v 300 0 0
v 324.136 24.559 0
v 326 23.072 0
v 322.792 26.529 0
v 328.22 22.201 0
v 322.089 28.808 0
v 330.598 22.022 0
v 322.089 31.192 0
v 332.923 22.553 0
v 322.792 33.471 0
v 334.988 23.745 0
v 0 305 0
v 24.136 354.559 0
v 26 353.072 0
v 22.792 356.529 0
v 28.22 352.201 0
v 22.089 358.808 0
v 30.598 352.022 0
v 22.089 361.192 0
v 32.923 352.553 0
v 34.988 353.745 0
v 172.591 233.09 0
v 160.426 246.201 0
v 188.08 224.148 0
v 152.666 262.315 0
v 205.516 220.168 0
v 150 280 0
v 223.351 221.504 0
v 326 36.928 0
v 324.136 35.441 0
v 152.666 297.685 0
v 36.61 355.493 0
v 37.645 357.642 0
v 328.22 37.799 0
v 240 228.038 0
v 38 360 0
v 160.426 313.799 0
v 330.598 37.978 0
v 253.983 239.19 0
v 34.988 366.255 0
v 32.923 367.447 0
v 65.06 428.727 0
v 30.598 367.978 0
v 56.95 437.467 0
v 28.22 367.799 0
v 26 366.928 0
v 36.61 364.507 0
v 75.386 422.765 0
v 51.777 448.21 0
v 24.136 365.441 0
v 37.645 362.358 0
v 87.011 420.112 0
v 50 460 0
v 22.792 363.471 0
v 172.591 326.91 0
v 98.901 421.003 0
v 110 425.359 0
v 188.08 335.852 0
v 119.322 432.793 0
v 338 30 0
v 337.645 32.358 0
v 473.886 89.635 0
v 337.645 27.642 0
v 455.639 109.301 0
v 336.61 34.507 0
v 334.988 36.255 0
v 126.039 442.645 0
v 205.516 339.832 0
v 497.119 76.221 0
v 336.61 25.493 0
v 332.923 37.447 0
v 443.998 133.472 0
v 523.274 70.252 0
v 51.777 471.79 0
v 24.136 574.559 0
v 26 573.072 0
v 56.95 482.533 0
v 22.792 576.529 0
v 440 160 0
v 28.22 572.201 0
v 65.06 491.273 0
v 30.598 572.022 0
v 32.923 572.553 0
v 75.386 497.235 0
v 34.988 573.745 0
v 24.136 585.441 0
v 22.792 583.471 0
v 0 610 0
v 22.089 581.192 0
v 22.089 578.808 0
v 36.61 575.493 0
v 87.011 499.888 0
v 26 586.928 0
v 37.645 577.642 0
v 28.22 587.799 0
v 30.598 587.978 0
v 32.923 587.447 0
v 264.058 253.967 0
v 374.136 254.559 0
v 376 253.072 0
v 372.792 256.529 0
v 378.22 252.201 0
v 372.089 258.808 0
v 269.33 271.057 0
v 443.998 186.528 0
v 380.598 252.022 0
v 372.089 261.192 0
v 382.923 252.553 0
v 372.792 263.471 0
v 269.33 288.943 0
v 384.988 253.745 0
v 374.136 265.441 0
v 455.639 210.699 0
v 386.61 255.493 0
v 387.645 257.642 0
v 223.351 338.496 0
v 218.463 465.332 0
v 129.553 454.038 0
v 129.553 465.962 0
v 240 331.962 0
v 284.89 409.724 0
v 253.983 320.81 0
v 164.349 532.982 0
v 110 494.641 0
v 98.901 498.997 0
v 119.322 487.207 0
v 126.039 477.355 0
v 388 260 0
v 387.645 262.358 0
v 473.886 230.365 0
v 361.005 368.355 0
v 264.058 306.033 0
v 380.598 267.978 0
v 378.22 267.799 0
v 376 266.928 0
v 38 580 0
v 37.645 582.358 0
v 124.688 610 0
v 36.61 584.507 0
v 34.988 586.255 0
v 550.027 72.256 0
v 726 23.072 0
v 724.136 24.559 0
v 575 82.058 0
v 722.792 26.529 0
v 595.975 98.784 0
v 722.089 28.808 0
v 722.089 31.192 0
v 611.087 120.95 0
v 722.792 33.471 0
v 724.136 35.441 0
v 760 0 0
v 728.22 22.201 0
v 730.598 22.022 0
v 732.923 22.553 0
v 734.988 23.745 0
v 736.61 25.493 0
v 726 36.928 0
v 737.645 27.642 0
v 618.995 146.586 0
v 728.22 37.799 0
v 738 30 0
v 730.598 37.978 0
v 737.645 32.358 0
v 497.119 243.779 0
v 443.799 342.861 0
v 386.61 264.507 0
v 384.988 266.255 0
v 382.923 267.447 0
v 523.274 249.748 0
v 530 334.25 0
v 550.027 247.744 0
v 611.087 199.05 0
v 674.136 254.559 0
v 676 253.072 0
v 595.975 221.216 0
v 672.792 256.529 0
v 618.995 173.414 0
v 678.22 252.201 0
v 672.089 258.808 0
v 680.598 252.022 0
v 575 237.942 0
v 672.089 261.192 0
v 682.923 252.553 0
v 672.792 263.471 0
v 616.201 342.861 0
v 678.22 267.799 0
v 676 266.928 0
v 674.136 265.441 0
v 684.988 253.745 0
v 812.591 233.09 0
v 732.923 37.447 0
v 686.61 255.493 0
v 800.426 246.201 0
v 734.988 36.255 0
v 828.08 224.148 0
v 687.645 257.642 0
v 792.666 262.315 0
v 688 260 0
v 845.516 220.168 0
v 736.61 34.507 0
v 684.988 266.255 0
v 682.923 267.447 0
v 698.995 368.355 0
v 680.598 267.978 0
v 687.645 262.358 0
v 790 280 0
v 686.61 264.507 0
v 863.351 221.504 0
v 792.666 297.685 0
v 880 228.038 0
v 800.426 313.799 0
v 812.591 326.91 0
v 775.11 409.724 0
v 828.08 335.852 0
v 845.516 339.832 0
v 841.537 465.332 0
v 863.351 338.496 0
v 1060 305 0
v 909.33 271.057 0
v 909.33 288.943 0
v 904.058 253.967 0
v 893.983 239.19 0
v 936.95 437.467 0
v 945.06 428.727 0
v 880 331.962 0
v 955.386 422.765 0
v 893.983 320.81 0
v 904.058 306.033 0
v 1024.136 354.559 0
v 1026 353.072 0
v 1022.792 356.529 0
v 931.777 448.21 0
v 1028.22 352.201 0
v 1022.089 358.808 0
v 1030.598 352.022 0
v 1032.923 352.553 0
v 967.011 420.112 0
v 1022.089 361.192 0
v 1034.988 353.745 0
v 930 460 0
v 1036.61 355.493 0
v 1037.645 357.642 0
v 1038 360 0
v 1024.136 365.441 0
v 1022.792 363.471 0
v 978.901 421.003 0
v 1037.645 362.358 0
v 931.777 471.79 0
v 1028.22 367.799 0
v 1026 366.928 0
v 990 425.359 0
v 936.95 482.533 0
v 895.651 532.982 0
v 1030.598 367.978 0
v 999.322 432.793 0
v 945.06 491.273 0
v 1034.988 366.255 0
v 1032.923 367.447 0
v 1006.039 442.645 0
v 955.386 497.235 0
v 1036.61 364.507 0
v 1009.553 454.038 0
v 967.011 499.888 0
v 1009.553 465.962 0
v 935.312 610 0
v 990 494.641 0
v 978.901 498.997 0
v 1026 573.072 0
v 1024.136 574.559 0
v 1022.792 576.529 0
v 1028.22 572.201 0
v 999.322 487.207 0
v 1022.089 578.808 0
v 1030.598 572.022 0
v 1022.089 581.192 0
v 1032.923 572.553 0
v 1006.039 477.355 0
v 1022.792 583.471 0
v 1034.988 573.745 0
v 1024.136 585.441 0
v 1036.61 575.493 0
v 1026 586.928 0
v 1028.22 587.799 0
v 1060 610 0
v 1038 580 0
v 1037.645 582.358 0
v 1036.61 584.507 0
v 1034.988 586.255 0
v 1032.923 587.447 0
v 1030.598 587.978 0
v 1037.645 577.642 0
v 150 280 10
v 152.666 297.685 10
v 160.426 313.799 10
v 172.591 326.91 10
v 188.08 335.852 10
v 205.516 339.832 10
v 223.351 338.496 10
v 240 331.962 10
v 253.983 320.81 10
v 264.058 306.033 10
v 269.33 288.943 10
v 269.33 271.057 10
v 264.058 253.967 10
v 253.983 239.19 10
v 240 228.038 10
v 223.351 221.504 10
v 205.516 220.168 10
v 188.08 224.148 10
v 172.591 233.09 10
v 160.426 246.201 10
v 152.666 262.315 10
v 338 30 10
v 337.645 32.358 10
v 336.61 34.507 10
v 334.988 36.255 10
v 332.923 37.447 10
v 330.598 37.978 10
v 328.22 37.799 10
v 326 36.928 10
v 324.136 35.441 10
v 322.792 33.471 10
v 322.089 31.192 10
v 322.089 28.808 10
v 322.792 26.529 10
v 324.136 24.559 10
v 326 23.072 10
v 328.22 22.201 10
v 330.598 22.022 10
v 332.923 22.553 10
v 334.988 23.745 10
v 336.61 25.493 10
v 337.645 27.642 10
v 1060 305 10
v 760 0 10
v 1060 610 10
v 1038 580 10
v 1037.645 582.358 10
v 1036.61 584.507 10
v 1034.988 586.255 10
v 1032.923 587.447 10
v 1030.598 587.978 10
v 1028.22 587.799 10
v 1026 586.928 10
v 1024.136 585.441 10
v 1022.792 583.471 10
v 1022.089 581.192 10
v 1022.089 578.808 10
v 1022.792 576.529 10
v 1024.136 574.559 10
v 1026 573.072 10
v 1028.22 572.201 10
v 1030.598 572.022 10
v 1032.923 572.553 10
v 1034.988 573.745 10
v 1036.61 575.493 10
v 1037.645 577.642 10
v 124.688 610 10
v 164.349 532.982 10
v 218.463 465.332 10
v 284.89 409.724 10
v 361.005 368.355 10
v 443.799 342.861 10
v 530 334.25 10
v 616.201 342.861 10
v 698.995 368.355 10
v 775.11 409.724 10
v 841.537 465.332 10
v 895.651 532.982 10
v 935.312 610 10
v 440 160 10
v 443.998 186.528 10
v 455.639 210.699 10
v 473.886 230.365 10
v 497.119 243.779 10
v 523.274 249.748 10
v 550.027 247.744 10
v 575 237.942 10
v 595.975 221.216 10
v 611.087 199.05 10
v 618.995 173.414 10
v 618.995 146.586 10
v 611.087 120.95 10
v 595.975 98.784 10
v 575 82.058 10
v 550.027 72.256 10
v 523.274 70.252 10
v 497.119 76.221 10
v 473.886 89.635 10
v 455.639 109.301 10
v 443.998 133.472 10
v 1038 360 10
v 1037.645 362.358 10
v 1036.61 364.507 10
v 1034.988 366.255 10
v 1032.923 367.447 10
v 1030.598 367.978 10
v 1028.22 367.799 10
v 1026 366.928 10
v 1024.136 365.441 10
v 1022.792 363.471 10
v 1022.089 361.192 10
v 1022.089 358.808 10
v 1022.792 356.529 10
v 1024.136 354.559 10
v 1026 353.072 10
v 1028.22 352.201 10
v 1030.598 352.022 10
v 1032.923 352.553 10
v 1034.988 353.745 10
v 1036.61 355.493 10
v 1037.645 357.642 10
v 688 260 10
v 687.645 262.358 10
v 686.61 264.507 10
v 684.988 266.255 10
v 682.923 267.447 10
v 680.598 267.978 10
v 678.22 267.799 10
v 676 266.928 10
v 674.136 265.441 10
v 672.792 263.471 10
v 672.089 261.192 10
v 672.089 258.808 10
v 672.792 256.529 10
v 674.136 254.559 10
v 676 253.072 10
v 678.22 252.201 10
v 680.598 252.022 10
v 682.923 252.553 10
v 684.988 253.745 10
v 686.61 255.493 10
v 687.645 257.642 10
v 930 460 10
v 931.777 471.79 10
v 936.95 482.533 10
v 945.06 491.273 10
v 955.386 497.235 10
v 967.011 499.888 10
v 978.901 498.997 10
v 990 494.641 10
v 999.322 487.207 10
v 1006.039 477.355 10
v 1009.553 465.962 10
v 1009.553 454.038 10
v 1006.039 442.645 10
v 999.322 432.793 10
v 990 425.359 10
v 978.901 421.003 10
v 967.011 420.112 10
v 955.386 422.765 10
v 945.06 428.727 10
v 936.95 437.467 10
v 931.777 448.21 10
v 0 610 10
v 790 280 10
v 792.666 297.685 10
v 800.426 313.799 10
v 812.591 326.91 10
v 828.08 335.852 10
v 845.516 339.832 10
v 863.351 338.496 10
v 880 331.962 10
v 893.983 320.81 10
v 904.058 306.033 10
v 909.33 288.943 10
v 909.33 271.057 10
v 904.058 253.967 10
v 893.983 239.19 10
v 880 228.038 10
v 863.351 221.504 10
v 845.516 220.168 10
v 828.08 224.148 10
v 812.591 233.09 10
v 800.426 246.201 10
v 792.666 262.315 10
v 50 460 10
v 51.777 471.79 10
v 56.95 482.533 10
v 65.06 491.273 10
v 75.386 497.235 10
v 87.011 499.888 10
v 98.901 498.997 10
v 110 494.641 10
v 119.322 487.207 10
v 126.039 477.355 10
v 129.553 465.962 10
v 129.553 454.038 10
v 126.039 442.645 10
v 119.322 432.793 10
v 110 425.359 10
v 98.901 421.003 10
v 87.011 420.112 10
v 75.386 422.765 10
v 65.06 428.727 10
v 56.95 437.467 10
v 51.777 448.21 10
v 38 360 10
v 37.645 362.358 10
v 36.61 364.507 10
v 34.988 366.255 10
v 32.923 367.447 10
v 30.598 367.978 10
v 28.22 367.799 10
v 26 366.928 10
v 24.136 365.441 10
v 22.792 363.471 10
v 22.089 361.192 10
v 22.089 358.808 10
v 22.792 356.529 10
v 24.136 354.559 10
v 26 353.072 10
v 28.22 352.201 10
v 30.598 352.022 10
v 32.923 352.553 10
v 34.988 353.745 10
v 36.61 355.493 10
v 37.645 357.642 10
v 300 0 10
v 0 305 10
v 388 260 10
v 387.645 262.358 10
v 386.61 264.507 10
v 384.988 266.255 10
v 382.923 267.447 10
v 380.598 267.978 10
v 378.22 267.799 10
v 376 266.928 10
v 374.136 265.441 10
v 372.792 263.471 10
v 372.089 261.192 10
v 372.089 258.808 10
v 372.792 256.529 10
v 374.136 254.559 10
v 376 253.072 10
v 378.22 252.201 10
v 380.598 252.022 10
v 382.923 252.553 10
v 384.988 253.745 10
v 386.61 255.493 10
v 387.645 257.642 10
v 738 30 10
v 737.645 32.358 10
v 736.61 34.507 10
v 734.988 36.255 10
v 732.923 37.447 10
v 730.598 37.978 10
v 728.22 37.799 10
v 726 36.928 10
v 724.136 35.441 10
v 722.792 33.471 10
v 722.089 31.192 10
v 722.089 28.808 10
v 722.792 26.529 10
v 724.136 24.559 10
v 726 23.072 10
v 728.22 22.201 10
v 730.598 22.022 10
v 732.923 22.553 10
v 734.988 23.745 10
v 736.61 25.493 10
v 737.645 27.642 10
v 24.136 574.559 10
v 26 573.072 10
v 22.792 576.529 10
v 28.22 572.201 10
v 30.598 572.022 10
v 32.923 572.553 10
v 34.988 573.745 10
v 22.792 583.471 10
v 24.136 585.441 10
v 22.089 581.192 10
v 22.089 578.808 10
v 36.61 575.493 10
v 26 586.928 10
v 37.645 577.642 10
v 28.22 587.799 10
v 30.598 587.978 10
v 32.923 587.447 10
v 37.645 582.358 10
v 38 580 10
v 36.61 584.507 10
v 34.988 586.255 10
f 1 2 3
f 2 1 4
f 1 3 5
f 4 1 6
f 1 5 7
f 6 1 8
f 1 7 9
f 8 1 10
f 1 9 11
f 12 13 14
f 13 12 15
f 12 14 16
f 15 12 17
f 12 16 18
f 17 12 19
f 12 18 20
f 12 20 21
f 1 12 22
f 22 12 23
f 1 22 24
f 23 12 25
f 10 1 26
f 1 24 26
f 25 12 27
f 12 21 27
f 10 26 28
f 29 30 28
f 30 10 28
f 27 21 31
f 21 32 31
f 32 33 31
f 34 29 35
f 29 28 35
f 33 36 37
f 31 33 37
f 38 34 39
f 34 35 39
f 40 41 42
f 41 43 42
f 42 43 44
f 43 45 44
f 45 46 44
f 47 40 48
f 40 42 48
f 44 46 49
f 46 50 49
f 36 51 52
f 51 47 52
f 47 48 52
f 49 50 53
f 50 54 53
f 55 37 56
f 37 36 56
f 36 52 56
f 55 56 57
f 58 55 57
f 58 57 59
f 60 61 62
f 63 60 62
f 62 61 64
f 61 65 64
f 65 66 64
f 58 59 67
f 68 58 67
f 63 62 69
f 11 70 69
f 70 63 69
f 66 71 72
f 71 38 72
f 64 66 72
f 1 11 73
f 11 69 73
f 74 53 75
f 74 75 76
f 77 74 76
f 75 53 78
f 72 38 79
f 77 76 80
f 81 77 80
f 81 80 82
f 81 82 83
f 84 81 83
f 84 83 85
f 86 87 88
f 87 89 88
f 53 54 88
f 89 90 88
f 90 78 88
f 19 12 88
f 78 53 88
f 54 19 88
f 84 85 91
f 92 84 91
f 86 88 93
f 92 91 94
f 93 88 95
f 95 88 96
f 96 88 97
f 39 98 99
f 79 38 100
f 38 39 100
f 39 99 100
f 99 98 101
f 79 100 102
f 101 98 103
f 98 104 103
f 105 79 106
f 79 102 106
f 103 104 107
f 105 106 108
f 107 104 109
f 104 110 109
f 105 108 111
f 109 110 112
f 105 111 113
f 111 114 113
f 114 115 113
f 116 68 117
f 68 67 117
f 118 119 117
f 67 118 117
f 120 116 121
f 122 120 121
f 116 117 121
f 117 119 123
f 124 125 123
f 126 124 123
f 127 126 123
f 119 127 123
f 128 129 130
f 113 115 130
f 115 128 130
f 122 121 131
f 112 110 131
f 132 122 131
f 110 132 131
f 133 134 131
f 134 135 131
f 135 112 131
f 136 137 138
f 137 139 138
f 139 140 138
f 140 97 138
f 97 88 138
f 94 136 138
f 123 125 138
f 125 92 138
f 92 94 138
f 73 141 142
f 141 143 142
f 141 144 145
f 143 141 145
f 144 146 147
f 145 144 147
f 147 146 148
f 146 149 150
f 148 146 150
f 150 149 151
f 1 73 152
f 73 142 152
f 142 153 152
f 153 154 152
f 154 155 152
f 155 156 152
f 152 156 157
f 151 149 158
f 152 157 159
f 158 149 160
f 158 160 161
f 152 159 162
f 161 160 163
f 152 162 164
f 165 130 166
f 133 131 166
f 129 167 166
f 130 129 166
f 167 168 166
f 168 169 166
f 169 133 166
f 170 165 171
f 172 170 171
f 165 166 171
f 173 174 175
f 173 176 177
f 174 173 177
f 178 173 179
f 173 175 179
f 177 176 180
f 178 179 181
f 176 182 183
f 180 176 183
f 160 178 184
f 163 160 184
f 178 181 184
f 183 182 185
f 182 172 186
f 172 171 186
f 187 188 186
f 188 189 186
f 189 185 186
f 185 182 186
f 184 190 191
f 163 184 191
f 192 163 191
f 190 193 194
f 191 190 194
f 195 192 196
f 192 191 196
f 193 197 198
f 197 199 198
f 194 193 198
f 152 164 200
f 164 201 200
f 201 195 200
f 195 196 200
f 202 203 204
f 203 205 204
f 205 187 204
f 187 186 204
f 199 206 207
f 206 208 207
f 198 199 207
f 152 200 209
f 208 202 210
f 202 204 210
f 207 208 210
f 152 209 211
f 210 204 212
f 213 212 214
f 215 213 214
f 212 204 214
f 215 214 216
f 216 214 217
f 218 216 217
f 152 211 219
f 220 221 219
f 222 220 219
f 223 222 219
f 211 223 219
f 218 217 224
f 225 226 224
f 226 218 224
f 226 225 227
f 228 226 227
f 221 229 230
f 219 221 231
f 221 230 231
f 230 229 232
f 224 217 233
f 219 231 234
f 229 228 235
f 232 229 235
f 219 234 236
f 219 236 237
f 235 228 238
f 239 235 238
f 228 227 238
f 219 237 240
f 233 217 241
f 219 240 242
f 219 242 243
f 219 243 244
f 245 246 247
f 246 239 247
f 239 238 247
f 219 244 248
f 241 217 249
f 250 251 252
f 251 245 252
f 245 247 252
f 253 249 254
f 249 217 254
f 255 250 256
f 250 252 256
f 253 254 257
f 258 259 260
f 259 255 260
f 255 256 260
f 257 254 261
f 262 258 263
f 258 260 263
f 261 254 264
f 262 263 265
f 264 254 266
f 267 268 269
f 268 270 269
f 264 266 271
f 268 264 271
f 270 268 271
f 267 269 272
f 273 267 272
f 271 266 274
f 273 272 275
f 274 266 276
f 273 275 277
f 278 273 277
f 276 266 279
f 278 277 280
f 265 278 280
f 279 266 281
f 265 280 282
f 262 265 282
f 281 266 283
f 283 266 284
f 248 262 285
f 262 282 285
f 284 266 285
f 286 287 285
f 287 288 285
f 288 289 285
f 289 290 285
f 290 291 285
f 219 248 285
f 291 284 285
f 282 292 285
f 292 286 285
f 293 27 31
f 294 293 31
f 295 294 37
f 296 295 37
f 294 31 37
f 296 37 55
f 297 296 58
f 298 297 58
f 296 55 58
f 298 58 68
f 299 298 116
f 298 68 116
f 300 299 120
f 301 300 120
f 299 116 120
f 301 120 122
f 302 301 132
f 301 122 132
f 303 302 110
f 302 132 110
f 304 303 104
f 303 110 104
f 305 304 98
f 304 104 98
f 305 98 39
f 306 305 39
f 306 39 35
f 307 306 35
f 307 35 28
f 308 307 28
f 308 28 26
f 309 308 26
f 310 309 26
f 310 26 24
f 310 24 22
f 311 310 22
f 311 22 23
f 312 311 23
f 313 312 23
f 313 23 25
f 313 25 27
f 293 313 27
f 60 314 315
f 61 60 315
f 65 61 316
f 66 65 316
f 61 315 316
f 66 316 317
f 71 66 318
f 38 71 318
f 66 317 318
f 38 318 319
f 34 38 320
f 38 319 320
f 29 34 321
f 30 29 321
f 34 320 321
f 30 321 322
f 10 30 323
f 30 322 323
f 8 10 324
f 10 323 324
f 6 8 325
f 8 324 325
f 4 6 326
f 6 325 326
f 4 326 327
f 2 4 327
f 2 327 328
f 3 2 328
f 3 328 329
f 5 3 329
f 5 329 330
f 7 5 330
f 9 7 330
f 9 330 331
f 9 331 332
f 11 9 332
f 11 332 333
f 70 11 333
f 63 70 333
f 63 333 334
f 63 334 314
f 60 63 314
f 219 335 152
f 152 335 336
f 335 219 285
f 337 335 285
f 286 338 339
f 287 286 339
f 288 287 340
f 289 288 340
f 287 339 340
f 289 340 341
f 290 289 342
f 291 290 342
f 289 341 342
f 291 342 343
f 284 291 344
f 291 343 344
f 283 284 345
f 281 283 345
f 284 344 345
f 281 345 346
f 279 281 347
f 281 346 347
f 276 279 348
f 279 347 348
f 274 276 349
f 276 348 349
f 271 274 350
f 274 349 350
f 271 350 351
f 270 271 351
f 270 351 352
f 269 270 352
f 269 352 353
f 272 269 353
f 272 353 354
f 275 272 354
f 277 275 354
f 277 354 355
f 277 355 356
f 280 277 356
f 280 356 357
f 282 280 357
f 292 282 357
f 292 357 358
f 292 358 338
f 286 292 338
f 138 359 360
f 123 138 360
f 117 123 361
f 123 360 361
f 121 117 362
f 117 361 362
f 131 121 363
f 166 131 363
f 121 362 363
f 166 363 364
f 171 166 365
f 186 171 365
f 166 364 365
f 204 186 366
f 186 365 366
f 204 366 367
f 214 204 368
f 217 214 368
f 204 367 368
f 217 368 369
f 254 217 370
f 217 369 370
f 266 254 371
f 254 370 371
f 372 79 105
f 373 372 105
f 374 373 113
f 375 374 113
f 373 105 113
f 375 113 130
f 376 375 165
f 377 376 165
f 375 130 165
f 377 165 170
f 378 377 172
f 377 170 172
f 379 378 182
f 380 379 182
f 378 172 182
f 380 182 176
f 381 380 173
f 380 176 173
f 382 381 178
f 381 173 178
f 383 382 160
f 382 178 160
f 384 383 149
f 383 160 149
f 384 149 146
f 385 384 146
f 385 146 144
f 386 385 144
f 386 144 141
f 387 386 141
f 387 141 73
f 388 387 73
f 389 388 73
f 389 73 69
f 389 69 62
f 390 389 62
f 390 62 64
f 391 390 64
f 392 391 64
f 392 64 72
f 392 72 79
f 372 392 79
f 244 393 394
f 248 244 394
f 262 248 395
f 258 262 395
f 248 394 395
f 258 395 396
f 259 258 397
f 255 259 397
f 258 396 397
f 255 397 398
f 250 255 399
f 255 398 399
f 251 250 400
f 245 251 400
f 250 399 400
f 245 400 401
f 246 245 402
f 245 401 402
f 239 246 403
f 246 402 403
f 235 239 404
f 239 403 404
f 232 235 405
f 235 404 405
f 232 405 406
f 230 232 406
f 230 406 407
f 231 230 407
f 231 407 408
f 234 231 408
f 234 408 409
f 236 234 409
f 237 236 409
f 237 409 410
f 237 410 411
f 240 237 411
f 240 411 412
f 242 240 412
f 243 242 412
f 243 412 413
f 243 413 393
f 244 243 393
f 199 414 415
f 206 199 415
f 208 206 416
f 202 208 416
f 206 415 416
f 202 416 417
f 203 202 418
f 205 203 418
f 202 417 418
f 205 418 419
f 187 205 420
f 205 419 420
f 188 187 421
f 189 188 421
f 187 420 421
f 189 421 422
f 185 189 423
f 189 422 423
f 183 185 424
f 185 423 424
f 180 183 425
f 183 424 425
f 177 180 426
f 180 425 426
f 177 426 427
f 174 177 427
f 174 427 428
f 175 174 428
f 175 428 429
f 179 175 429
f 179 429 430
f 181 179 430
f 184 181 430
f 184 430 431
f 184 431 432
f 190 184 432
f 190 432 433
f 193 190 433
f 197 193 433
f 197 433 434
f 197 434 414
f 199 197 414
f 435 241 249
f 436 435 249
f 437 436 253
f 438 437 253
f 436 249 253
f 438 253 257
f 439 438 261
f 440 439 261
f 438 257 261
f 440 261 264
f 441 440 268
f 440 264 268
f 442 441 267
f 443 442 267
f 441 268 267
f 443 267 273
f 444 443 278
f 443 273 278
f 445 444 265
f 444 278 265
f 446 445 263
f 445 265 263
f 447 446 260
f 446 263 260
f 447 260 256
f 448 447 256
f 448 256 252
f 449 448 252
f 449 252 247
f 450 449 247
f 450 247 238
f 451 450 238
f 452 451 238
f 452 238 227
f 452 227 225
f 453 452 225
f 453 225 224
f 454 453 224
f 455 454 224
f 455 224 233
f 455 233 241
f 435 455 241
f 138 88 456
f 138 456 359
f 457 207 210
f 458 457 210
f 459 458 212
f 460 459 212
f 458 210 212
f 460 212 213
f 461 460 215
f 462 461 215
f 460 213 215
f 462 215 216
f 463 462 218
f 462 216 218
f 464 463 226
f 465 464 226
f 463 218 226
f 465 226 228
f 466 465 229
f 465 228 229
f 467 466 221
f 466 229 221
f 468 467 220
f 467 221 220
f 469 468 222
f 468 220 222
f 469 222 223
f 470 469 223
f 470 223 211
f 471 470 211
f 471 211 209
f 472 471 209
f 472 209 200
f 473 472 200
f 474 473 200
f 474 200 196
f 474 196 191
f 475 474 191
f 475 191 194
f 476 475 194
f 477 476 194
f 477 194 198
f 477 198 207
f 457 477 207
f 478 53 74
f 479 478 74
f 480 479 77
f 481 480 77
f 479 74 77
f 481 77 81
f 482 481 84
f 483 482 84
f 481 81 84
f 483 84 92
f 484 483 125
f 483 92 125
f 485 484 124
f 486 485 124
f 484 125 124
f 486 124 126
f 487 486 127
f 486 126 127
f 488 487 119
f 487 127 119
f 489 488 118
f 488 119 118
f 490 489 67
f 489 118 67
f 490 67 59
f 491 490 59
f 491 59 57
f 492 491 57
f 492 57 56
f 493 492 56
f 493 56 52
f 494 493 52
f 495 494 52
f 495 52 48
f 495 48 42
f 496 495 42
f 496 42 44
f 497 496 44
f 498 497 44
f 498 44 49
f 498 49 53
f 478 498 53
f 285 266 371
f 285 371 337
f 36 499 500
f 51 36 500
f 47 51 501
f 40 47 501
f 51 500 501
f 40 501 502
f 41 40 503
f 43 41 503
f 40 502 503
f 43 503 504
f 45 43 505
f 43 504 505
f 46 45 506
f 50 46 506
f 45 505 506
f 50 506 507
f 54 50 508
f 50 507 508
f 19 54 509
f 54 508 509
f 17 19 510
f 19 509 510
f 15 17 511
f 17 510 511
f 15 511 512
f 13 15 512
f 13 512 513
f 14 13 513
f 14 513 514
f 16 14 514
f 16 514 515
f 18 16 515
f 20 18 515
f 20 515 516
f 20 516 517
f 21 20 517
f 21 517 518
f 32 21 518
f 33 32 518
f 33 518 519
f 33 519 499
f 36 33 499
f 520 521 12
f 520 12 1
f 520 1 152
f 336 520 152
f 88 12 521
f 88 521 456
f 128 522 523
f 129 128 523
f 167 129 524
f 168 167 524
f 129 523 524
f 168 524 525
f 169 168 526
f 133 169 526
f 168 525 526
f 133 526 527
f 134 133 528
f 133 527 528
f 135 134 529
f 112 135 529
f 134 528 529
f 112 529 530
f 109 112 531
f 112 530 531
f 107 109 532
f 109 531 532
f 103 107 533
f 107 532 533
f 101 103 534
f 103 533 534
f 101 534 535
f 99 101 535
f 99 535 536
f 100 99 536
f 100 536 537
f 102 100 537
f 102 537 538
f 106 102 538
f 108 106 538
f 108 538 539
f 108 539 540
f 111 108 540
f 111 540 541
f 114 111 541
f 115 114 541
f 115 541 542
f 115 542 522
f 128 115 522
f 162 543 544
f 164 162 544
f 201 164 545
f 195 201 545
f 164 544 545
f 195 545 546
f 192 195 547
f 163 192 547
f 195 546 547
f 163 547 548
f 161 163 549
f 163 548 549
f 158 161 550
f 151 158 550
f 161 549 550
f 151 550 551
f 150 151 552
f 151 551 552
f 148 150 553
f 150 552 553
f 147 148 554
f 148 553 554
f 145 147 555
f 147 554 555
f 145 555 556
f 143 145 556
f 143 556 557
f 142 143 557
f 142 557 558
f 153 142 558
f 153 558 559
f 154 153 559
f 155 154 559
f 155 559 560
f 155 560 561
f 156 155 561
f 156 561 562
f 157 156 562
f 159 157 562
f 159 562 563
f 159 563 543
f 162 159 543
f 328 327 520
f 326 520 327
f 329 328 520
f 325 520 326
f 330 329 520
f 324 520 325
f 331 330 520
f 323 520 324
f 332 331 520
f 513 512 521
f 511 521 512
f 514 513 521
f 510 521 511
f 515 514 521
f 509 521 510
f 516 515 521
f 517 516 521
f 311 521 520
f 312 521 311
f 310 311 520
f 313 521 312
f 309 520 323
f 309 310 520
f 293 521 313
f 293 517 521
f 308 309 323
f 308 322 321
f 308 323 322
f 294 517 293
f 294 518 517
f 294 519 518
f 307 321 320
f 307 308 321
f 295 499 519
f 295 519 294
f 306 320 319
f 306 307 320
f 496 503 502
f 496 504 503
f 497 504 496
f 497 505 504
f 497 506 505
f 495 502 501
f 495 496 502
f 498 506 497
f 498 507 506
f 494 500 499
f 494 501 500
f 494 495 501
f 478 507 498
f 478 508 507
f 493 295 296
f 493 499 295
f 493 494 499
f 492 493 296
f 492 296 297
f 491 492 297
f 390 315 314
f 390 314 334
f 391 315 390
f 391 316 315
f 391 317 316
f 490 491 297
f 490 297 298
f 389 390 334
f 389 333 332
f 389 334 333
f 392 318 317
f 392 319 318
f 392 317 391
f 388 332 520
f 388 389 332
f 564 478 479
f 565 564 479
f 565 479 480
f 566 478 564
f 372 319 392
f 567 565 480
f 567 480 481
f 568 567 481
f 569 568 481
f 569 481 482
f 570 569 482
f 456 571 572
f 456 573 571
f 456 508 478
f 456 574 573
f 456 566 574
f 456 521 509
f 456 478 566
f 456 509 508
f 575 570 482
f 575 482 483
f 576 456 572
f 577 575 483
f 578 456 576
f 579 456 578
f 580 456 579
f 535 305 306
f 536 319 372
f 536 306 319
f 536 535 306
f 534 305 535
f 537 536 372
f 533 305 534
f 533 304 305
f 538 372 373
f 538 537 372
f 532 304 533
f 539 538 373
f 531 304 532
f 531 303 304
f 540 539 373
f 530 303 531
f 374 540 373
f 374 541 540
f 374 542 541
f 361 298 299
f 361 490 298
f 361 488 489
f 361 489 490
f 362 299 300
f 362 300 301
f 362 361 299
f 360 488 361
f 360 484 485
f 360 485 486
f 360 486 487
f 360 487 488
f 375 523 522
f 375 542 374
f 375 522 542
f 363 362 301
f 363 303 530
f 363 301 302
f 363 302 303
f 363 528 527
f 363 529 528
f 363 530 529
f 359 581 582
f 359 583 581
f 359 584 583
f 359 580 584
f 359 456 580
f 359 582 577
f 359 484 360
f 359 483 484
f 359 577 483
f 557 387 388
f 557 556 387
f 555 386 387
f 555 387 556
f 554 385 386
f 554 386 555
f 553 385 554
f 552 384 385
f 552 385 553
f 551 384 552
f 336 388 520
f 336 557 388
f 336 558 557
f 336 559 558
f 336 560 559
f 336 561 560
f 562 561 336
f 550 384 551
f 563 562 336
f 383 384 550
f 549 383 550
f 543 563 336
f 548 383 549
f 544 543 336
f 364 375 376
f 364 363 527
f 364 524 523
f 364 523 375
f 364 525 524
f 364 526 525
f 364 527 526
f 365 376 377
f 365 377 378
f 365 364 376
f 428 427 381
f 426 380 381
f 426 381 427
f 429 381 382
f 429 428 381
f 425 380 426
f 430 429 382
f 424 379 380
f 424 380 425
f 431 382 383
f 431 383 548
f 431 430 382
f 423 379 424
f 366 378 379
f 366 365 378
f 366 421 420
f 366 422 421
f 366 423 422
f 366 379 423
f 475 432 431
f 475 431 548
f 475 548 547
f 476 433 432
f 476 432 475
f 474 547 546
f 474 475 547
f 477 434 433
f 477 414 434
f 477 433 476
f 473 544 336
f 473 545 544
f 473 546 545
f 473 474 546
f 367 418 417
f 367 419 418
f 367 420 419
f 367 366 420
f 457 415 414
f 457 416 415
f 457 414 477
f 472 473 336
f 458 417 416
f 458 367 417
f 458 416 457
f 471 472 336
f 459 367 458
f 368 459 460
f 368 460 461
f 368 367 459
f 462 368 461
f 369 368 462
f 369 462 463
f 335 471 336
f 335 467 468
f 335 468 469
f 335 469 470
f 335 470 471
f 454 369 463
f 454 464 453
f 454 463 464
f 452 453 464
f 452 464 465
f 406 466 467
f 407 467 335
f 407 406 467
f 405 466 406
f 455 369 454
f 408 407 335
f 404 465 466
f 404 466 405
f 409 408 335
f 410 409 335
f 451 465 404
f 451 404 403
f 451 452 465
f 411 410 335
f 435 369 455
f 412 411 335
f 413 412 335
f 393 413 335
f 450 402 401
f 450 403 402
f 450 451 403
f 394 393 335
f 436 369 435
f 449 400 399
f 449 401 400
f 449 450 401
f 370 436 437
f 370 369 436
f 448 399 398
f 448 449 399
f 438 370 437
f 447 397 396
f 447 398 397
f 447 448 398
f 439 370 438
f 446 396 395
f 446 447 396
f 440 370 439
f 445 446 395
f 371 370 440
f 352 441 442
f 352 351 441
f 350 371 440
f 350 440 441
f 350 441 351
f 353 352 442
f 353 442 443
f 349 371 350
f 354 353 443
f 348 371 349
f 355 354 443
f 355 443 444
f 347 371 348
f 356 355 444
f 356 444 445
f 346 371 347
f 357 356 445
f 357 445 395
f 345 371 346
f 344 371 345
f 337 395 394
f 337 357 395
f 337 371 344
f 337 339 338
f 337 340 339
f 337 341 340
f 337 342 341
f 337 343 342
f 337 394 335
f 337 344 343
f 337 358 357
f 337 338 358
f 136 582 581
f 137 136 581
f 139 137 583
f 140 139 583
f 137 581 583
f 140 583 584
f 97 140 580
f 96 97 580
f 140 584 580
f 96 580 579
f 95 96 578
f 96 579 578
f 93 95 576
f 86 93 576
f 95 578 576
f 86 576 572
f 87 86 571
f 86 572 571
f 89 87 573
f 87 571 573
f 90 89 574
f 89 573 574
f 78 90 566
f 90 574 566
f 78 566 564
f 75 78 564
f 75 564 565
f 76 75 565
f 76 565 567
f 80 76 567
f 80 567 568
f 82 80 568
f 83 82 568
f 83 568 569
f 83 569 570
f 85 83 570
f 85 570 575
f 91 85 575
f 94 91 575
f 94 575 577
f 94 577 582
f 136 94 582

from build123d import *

# Parameters (mm, degrees)
SKETCH_1_W                  = 1060
SKETCH_1_H                  = 610
EXTRUDE_1_DEPTH             = 10
CUT_EXTRUDE_2_DEPTH         = 10
HOLE_WIZARD_16_0_16_1_D     = 16
HOLE_WIZARD_16_0_16_1_DEPTH = 42
HOLE_WIZARD_16_0_16_1_TIP   = 4.806884952
SKETCH_6_R                  = 40
SKETCH_6_R_2                = 60
SKETCH_6_R_3                = 90
CUT_EXTRUDE_3_DEPTH         = 1224.029026638


with BuildPart() as part:
    # 草图1 → 凸台-拉伸1 (new body)
    with BuildSketch(Plane.XY):
        with Locations((530, 305)):
            Rectangle(SKETCH_1_W, SKETCH_1_H)
    extrude(amount=EXTRUDE_1_DEPTH)

    # 草图3 → 切除-拉伸2 (cut)
    with BuildSketch(Plane.XY.offset(10)):
        Polygon((0, 305), (300, 0), (0, 0), align=None)
        Polygon((1060, 305), (760, 0), (1060, 0), align=None)
        with BuildLine():
            Line((935.312302429, 610), (124.687697571, 610))
            ThreePointArc((124.687697571, 610), (530, 334.25), (935.312302429, 610))
        make_face()
    extrude(amount=-CUT_EXTRUDE_2_DEPTH, mode=Mode.SUBTRACT)

    # Ø16.0 (16) 直径孔1
    with Locations(Plane(origin=(0, 0, 0), x_dir=(-1, 0, 0), z_dir=(0, 0, -1))):
        with Locations((-1030, 580), (-1030, 360), (-730, 30), (-330, 30), (-30, 360), (-30, 580), (-680, 260), (-380, 260)):
            Hole(HOLE_WIZARD_16_0_16_1_D / 2, depth=HOLE_WIZARD_16_0_16_1_DEPTH)
            with Locations((0, 0, -(HOLE_WIZARD_16_0_16_1_DEPTH + HOLE_WIZARD_16_0_16_1_TIP / 2))):  # 118° drill point
                Cone(0, HOLE_WIZARD_16_0_16_1_D / 2, HOLE_WIZARD_16_0_16_1_TIP, mode=Mode.SUBTRACT)

    # 草图6 → 切除-拉伸3 (cut, through all)
    with BuildSketch(Plane(origin=(0, 0, 0), x_dir=(-1, 0, 0), z_dir=(0, 0, -1))):
        with Locations((-970, 460)):
            Circle(SKETCH_6_R)
        with Locations((-850, 280)):
            Circle(SKETCH_6_R_2)
        with Locations((-530, 160)):
            Circle(SKETCH_6_R_3)
        with Locations((-210, 280)):
            Circle(SKETCH_6_R_2)
        with Locations((-90, 460)):
            Circle(SKETCH_6_R)
    extrude(amount=-CUT_EXTRUDE_3_DEPTH, mode=Mode.SUBTRACT)


solid = part.part
